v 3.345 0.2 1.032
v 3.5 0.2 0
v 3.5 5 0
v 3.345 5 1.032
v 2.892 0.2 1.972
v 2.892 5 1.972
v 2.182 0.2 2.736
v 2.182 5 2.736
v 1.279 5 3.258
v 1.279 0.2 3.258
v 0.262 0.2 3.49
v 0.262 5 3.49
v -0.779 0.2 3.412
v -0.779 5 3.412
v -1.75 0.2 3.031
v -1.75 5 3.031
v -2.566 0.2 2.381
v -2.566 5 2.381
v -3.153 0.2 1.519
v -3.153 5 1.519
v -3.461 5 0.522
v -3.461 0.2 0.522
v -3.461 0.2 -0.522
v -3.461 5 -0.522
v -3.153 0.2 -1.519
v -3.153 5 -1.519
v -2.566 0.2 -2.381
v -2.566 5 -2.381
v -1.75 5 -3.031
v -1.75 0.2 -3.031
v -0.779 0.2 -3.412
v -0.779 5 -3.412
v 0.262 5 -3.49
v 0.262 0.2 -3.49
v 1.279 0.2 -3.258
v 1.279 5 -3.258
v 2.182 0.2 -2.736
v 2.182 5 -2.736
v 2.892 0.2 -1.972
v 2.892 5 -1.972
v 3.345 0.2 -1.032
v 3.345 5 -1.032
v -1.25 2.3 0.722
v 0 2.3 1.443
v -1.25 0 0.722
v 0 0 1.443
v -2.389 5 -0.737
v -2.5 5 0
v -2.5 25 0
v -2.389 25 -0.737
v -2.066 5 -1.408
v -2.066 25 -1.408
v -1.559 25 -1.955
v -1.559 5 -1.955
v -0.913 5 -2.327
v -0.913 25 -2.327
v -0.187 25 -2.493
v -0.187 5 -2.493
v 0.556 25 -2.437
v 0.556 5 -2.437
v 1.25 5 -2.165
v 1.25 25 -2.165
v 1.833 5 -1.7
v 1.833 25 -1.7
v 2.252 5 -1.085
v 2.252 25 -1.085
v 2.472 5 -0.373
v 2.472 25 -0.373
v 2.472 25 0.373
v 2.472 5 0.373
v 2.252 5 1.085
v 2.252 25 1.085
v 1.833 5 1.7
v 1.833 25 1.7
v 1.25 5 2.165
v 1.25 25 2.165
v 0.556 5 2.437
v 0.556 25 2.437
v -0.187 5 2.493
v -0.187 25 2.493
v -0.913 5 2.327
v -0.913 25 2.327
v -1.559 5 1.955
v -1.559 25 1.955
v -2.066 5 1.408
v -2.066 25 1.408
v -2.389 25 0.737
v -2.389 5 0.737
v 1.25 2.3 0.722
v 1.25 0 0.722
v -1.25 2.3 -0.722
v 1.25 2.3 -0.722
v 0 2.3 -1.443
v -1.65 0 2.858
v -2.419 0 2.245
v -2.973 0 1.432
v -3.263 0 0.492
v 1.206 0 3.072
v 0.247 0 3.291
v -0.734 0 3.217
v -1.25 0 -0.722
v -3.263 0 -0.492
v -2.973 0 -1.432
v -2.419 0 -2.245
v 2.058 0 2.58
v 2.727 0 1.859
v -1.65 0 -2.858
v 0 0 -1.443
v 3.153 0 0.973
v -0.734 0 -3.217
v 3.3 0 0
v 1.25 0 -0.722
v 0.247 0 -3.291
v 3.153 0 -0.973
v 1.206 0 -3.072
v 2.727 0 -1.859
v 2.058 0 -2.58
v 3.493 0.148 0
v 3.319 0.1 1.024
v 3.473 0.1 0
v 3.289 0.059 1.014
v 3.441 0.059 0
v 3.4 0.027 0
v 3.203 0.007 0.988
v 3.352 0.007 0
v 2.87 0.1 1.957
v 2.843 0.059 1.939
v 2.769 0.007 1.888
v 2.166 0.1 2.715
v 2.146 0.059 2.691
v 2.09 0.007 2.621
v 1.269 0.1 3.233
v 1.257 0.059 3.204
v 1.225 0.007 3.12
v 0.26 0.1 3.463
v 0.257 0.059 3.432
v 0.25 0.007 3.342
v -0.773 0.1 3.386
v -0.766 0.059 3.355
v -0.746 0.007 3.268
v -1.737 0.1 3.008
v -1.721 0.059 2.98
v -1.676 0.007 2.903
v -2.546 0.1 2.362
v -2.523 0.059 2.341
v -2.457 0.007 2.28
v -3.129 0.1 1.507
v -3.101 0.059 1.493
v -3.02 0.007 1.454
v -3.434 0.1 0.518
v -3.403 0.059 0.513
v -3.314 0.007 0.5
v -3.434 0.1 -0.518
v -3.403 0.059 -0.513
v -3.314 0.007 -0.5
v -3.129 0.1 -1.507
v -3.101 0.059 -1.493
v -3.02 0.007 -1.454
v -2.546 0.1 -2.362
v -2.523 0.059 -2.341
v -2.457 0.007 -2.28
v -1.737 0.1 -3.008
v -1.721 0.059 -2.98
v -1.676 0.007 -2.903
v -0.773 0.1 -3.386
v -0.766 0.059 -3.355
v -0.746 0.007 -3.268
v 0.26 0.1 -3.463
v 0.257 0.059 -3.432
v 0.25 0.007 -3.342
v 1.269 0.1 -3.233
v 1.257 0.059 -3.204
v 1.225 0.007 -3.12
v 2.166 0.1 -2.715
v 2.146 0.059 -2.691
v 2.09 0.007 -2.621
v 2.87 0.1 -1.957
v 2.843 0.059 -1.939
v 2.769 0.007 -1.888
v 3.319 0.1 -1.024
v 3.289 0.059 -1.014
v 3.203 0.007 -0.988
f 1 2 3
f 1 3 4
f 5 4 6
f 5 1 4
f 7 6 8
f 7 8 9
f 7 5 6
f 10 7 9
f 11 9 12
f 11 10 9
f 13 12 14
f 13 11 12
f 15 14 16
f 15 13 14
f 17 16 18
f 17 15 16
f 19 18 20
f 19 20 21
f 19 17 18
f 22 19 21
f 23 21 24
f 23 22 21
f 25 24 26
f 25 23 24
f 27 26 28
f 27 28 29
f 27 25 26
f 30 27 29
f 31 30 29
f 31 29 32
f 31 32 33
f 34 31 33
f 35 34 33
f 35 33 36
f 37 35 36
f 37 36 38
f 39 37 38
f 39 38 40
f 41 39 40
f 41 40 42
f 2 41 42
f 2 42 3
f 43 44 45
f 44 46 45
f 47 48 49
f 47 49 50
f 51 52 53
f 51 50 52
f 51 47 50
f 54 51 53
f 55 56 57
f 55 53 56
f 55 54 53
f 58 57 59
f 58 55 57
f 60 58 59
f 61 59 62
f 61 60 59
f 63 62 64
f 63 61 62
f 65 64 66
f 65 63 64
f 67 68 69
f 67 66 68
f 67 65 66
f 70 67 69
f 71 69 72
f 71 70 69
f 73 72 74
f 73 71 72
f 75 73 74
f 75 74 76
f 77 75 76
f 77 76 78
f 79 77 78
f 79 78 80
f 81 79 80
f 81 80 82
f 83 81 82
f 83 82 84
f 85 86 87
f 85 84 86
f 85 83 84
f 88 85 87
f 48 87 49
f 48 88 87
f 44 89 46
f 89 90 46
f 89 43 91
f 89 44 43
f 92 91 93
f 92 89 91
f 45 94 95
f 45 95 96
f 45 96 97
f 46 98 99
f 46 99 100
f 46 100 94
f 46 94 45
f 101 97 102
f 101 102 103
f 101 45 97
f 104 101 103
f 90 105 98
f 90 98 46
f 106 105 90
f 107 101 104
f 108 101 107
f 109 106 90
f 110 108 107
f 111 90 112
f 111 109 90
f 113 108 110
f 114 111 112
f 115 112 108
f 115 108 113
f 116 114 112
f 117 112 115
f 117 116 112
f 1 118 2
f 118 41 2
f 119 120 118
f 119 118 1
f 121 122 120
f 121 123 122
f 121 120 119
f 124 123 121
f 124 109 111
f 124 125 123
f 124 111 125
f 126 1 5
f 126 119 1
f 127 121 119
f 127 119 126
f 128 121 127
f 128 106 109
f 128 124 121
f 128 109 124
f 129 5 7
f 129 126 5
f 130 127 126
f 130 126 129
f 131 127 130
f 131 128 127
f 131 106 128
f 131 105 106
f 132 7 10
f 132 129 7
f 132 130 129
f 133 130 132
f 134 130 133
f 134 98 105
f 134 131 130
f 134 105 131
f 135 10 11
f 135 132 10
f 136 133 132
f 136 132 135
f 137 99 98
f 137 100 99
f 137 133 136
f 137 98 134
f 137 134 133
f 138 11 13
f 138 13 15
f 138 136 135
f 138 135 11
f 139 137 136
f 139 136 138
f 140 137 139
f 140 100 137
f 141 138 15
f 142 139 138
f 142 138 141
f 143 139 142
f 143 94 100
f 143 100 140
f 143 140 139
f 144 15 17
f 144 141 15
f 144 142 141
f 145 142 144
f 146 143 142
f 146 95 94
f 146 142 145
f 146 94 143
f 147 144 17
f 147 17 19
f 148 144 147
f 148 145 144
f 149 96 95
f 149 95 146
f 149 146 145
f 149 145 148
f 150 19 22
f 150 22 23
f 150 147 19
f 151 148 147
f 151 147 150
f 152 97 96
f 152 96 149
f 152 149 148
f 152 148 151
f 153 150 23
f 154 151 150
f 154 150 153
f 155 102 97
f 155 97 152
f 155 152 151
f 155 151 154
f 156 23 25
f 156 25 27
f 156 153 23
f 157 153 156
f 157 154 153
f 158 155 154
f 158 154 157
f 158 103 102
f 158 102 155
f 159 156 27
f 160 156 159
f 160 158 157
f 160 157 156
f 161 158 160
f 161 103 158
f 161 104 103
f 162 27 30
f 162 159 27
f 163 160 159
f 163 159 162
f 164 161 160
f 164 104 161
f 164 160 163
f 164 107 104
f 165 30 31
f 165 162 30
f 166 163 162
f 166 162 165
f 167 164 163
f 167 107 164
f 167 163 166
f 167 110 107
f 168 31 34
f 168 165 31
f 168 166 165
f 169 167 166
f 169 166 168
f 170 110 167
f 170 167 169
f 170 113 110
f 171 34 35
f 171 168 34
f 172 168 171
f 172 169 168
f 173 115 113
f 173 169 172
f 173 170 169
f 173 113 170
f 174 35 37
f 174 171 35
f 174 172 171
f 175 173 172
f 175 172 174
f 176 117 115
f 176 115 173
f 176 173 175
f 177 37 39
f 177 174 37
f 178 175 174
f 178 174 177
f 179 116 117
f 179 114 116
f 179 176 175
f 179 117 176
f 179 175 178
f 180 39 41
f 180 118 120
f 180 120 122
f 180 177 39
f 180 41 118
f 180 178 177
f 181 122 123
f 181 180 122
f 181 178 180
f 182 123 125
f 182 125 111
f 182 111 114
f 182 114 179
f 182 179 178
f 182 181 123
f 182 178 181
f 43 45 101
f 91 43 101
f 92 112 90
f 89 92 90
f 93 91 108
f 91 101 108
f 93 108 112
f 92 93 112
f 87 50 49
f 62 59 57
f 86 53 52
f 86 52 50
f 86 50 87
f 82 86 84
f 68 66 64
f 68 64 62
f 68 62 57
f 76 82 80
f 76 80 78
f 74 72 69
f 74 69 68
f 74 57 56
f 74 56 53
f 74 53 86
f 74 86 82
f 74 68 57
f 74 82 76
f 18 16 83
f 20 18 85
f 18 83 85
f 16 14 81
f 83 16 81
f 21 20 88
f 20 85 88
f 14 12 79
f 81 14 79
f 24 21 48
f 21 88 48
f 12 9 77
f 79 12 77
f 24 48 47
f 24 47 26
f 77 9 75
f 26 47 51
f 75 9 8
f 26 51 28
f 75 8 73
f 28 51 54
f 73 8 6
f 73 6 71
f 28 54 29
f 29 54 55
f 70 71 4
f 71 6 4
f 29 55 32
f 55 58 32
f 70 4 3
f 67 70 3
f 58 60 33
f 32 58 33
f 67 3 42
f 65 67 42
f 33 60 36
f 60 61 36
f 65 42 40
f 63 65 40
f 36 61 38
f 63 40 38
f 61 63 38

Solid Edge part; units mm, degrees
sketch "Sketch1" plane through (0, 0, 0) normal (0, -1, 0) x (1, 0, 0)
  circle A0 centre (0, 0) radius 3.5
extrude "Protrusion1" add sketch "Sketch1" against normal blind 5
sketch "Sketch2" plane through (0, 5, 0) normal (0, 1, 0) x (-1, 0, 0)
  circle A0 centre (0, 0) radius 2.5
extrude "ExtrudedProtrusion_2" add sketch "Sketch2" along normal blind 20
cosmetic_thread "Thread_1" size "M5" thread depth 20
fillet "Round_1" radius 0.2 1 edges at (-3.5, 0, 0)
sketch "Sketch3" plane through (0, 0, 0) normal (0, -1, 0) x (1, 0, 0)
  line L0 (0, 1.4434) -> (-1.25, 0.7217)
  line L1 (-1.25, 0.7217) -> (-1.25, -0.7217)
  line L2 (-1.25, -0.7217) -> (0, -1.4434)
  line L3 (0, -1.4434) -> (1.25, -0.7217)
  line L4 (1.25, -0.7217) -> (1.25, 0.7217)
  line L5 (1.25, 0.7217) -> (0, 1.4434)
extrude "ExtrudedCutout_2" cut sketch "Sketch3" against normal blind 2.3
properties material "Steel"
